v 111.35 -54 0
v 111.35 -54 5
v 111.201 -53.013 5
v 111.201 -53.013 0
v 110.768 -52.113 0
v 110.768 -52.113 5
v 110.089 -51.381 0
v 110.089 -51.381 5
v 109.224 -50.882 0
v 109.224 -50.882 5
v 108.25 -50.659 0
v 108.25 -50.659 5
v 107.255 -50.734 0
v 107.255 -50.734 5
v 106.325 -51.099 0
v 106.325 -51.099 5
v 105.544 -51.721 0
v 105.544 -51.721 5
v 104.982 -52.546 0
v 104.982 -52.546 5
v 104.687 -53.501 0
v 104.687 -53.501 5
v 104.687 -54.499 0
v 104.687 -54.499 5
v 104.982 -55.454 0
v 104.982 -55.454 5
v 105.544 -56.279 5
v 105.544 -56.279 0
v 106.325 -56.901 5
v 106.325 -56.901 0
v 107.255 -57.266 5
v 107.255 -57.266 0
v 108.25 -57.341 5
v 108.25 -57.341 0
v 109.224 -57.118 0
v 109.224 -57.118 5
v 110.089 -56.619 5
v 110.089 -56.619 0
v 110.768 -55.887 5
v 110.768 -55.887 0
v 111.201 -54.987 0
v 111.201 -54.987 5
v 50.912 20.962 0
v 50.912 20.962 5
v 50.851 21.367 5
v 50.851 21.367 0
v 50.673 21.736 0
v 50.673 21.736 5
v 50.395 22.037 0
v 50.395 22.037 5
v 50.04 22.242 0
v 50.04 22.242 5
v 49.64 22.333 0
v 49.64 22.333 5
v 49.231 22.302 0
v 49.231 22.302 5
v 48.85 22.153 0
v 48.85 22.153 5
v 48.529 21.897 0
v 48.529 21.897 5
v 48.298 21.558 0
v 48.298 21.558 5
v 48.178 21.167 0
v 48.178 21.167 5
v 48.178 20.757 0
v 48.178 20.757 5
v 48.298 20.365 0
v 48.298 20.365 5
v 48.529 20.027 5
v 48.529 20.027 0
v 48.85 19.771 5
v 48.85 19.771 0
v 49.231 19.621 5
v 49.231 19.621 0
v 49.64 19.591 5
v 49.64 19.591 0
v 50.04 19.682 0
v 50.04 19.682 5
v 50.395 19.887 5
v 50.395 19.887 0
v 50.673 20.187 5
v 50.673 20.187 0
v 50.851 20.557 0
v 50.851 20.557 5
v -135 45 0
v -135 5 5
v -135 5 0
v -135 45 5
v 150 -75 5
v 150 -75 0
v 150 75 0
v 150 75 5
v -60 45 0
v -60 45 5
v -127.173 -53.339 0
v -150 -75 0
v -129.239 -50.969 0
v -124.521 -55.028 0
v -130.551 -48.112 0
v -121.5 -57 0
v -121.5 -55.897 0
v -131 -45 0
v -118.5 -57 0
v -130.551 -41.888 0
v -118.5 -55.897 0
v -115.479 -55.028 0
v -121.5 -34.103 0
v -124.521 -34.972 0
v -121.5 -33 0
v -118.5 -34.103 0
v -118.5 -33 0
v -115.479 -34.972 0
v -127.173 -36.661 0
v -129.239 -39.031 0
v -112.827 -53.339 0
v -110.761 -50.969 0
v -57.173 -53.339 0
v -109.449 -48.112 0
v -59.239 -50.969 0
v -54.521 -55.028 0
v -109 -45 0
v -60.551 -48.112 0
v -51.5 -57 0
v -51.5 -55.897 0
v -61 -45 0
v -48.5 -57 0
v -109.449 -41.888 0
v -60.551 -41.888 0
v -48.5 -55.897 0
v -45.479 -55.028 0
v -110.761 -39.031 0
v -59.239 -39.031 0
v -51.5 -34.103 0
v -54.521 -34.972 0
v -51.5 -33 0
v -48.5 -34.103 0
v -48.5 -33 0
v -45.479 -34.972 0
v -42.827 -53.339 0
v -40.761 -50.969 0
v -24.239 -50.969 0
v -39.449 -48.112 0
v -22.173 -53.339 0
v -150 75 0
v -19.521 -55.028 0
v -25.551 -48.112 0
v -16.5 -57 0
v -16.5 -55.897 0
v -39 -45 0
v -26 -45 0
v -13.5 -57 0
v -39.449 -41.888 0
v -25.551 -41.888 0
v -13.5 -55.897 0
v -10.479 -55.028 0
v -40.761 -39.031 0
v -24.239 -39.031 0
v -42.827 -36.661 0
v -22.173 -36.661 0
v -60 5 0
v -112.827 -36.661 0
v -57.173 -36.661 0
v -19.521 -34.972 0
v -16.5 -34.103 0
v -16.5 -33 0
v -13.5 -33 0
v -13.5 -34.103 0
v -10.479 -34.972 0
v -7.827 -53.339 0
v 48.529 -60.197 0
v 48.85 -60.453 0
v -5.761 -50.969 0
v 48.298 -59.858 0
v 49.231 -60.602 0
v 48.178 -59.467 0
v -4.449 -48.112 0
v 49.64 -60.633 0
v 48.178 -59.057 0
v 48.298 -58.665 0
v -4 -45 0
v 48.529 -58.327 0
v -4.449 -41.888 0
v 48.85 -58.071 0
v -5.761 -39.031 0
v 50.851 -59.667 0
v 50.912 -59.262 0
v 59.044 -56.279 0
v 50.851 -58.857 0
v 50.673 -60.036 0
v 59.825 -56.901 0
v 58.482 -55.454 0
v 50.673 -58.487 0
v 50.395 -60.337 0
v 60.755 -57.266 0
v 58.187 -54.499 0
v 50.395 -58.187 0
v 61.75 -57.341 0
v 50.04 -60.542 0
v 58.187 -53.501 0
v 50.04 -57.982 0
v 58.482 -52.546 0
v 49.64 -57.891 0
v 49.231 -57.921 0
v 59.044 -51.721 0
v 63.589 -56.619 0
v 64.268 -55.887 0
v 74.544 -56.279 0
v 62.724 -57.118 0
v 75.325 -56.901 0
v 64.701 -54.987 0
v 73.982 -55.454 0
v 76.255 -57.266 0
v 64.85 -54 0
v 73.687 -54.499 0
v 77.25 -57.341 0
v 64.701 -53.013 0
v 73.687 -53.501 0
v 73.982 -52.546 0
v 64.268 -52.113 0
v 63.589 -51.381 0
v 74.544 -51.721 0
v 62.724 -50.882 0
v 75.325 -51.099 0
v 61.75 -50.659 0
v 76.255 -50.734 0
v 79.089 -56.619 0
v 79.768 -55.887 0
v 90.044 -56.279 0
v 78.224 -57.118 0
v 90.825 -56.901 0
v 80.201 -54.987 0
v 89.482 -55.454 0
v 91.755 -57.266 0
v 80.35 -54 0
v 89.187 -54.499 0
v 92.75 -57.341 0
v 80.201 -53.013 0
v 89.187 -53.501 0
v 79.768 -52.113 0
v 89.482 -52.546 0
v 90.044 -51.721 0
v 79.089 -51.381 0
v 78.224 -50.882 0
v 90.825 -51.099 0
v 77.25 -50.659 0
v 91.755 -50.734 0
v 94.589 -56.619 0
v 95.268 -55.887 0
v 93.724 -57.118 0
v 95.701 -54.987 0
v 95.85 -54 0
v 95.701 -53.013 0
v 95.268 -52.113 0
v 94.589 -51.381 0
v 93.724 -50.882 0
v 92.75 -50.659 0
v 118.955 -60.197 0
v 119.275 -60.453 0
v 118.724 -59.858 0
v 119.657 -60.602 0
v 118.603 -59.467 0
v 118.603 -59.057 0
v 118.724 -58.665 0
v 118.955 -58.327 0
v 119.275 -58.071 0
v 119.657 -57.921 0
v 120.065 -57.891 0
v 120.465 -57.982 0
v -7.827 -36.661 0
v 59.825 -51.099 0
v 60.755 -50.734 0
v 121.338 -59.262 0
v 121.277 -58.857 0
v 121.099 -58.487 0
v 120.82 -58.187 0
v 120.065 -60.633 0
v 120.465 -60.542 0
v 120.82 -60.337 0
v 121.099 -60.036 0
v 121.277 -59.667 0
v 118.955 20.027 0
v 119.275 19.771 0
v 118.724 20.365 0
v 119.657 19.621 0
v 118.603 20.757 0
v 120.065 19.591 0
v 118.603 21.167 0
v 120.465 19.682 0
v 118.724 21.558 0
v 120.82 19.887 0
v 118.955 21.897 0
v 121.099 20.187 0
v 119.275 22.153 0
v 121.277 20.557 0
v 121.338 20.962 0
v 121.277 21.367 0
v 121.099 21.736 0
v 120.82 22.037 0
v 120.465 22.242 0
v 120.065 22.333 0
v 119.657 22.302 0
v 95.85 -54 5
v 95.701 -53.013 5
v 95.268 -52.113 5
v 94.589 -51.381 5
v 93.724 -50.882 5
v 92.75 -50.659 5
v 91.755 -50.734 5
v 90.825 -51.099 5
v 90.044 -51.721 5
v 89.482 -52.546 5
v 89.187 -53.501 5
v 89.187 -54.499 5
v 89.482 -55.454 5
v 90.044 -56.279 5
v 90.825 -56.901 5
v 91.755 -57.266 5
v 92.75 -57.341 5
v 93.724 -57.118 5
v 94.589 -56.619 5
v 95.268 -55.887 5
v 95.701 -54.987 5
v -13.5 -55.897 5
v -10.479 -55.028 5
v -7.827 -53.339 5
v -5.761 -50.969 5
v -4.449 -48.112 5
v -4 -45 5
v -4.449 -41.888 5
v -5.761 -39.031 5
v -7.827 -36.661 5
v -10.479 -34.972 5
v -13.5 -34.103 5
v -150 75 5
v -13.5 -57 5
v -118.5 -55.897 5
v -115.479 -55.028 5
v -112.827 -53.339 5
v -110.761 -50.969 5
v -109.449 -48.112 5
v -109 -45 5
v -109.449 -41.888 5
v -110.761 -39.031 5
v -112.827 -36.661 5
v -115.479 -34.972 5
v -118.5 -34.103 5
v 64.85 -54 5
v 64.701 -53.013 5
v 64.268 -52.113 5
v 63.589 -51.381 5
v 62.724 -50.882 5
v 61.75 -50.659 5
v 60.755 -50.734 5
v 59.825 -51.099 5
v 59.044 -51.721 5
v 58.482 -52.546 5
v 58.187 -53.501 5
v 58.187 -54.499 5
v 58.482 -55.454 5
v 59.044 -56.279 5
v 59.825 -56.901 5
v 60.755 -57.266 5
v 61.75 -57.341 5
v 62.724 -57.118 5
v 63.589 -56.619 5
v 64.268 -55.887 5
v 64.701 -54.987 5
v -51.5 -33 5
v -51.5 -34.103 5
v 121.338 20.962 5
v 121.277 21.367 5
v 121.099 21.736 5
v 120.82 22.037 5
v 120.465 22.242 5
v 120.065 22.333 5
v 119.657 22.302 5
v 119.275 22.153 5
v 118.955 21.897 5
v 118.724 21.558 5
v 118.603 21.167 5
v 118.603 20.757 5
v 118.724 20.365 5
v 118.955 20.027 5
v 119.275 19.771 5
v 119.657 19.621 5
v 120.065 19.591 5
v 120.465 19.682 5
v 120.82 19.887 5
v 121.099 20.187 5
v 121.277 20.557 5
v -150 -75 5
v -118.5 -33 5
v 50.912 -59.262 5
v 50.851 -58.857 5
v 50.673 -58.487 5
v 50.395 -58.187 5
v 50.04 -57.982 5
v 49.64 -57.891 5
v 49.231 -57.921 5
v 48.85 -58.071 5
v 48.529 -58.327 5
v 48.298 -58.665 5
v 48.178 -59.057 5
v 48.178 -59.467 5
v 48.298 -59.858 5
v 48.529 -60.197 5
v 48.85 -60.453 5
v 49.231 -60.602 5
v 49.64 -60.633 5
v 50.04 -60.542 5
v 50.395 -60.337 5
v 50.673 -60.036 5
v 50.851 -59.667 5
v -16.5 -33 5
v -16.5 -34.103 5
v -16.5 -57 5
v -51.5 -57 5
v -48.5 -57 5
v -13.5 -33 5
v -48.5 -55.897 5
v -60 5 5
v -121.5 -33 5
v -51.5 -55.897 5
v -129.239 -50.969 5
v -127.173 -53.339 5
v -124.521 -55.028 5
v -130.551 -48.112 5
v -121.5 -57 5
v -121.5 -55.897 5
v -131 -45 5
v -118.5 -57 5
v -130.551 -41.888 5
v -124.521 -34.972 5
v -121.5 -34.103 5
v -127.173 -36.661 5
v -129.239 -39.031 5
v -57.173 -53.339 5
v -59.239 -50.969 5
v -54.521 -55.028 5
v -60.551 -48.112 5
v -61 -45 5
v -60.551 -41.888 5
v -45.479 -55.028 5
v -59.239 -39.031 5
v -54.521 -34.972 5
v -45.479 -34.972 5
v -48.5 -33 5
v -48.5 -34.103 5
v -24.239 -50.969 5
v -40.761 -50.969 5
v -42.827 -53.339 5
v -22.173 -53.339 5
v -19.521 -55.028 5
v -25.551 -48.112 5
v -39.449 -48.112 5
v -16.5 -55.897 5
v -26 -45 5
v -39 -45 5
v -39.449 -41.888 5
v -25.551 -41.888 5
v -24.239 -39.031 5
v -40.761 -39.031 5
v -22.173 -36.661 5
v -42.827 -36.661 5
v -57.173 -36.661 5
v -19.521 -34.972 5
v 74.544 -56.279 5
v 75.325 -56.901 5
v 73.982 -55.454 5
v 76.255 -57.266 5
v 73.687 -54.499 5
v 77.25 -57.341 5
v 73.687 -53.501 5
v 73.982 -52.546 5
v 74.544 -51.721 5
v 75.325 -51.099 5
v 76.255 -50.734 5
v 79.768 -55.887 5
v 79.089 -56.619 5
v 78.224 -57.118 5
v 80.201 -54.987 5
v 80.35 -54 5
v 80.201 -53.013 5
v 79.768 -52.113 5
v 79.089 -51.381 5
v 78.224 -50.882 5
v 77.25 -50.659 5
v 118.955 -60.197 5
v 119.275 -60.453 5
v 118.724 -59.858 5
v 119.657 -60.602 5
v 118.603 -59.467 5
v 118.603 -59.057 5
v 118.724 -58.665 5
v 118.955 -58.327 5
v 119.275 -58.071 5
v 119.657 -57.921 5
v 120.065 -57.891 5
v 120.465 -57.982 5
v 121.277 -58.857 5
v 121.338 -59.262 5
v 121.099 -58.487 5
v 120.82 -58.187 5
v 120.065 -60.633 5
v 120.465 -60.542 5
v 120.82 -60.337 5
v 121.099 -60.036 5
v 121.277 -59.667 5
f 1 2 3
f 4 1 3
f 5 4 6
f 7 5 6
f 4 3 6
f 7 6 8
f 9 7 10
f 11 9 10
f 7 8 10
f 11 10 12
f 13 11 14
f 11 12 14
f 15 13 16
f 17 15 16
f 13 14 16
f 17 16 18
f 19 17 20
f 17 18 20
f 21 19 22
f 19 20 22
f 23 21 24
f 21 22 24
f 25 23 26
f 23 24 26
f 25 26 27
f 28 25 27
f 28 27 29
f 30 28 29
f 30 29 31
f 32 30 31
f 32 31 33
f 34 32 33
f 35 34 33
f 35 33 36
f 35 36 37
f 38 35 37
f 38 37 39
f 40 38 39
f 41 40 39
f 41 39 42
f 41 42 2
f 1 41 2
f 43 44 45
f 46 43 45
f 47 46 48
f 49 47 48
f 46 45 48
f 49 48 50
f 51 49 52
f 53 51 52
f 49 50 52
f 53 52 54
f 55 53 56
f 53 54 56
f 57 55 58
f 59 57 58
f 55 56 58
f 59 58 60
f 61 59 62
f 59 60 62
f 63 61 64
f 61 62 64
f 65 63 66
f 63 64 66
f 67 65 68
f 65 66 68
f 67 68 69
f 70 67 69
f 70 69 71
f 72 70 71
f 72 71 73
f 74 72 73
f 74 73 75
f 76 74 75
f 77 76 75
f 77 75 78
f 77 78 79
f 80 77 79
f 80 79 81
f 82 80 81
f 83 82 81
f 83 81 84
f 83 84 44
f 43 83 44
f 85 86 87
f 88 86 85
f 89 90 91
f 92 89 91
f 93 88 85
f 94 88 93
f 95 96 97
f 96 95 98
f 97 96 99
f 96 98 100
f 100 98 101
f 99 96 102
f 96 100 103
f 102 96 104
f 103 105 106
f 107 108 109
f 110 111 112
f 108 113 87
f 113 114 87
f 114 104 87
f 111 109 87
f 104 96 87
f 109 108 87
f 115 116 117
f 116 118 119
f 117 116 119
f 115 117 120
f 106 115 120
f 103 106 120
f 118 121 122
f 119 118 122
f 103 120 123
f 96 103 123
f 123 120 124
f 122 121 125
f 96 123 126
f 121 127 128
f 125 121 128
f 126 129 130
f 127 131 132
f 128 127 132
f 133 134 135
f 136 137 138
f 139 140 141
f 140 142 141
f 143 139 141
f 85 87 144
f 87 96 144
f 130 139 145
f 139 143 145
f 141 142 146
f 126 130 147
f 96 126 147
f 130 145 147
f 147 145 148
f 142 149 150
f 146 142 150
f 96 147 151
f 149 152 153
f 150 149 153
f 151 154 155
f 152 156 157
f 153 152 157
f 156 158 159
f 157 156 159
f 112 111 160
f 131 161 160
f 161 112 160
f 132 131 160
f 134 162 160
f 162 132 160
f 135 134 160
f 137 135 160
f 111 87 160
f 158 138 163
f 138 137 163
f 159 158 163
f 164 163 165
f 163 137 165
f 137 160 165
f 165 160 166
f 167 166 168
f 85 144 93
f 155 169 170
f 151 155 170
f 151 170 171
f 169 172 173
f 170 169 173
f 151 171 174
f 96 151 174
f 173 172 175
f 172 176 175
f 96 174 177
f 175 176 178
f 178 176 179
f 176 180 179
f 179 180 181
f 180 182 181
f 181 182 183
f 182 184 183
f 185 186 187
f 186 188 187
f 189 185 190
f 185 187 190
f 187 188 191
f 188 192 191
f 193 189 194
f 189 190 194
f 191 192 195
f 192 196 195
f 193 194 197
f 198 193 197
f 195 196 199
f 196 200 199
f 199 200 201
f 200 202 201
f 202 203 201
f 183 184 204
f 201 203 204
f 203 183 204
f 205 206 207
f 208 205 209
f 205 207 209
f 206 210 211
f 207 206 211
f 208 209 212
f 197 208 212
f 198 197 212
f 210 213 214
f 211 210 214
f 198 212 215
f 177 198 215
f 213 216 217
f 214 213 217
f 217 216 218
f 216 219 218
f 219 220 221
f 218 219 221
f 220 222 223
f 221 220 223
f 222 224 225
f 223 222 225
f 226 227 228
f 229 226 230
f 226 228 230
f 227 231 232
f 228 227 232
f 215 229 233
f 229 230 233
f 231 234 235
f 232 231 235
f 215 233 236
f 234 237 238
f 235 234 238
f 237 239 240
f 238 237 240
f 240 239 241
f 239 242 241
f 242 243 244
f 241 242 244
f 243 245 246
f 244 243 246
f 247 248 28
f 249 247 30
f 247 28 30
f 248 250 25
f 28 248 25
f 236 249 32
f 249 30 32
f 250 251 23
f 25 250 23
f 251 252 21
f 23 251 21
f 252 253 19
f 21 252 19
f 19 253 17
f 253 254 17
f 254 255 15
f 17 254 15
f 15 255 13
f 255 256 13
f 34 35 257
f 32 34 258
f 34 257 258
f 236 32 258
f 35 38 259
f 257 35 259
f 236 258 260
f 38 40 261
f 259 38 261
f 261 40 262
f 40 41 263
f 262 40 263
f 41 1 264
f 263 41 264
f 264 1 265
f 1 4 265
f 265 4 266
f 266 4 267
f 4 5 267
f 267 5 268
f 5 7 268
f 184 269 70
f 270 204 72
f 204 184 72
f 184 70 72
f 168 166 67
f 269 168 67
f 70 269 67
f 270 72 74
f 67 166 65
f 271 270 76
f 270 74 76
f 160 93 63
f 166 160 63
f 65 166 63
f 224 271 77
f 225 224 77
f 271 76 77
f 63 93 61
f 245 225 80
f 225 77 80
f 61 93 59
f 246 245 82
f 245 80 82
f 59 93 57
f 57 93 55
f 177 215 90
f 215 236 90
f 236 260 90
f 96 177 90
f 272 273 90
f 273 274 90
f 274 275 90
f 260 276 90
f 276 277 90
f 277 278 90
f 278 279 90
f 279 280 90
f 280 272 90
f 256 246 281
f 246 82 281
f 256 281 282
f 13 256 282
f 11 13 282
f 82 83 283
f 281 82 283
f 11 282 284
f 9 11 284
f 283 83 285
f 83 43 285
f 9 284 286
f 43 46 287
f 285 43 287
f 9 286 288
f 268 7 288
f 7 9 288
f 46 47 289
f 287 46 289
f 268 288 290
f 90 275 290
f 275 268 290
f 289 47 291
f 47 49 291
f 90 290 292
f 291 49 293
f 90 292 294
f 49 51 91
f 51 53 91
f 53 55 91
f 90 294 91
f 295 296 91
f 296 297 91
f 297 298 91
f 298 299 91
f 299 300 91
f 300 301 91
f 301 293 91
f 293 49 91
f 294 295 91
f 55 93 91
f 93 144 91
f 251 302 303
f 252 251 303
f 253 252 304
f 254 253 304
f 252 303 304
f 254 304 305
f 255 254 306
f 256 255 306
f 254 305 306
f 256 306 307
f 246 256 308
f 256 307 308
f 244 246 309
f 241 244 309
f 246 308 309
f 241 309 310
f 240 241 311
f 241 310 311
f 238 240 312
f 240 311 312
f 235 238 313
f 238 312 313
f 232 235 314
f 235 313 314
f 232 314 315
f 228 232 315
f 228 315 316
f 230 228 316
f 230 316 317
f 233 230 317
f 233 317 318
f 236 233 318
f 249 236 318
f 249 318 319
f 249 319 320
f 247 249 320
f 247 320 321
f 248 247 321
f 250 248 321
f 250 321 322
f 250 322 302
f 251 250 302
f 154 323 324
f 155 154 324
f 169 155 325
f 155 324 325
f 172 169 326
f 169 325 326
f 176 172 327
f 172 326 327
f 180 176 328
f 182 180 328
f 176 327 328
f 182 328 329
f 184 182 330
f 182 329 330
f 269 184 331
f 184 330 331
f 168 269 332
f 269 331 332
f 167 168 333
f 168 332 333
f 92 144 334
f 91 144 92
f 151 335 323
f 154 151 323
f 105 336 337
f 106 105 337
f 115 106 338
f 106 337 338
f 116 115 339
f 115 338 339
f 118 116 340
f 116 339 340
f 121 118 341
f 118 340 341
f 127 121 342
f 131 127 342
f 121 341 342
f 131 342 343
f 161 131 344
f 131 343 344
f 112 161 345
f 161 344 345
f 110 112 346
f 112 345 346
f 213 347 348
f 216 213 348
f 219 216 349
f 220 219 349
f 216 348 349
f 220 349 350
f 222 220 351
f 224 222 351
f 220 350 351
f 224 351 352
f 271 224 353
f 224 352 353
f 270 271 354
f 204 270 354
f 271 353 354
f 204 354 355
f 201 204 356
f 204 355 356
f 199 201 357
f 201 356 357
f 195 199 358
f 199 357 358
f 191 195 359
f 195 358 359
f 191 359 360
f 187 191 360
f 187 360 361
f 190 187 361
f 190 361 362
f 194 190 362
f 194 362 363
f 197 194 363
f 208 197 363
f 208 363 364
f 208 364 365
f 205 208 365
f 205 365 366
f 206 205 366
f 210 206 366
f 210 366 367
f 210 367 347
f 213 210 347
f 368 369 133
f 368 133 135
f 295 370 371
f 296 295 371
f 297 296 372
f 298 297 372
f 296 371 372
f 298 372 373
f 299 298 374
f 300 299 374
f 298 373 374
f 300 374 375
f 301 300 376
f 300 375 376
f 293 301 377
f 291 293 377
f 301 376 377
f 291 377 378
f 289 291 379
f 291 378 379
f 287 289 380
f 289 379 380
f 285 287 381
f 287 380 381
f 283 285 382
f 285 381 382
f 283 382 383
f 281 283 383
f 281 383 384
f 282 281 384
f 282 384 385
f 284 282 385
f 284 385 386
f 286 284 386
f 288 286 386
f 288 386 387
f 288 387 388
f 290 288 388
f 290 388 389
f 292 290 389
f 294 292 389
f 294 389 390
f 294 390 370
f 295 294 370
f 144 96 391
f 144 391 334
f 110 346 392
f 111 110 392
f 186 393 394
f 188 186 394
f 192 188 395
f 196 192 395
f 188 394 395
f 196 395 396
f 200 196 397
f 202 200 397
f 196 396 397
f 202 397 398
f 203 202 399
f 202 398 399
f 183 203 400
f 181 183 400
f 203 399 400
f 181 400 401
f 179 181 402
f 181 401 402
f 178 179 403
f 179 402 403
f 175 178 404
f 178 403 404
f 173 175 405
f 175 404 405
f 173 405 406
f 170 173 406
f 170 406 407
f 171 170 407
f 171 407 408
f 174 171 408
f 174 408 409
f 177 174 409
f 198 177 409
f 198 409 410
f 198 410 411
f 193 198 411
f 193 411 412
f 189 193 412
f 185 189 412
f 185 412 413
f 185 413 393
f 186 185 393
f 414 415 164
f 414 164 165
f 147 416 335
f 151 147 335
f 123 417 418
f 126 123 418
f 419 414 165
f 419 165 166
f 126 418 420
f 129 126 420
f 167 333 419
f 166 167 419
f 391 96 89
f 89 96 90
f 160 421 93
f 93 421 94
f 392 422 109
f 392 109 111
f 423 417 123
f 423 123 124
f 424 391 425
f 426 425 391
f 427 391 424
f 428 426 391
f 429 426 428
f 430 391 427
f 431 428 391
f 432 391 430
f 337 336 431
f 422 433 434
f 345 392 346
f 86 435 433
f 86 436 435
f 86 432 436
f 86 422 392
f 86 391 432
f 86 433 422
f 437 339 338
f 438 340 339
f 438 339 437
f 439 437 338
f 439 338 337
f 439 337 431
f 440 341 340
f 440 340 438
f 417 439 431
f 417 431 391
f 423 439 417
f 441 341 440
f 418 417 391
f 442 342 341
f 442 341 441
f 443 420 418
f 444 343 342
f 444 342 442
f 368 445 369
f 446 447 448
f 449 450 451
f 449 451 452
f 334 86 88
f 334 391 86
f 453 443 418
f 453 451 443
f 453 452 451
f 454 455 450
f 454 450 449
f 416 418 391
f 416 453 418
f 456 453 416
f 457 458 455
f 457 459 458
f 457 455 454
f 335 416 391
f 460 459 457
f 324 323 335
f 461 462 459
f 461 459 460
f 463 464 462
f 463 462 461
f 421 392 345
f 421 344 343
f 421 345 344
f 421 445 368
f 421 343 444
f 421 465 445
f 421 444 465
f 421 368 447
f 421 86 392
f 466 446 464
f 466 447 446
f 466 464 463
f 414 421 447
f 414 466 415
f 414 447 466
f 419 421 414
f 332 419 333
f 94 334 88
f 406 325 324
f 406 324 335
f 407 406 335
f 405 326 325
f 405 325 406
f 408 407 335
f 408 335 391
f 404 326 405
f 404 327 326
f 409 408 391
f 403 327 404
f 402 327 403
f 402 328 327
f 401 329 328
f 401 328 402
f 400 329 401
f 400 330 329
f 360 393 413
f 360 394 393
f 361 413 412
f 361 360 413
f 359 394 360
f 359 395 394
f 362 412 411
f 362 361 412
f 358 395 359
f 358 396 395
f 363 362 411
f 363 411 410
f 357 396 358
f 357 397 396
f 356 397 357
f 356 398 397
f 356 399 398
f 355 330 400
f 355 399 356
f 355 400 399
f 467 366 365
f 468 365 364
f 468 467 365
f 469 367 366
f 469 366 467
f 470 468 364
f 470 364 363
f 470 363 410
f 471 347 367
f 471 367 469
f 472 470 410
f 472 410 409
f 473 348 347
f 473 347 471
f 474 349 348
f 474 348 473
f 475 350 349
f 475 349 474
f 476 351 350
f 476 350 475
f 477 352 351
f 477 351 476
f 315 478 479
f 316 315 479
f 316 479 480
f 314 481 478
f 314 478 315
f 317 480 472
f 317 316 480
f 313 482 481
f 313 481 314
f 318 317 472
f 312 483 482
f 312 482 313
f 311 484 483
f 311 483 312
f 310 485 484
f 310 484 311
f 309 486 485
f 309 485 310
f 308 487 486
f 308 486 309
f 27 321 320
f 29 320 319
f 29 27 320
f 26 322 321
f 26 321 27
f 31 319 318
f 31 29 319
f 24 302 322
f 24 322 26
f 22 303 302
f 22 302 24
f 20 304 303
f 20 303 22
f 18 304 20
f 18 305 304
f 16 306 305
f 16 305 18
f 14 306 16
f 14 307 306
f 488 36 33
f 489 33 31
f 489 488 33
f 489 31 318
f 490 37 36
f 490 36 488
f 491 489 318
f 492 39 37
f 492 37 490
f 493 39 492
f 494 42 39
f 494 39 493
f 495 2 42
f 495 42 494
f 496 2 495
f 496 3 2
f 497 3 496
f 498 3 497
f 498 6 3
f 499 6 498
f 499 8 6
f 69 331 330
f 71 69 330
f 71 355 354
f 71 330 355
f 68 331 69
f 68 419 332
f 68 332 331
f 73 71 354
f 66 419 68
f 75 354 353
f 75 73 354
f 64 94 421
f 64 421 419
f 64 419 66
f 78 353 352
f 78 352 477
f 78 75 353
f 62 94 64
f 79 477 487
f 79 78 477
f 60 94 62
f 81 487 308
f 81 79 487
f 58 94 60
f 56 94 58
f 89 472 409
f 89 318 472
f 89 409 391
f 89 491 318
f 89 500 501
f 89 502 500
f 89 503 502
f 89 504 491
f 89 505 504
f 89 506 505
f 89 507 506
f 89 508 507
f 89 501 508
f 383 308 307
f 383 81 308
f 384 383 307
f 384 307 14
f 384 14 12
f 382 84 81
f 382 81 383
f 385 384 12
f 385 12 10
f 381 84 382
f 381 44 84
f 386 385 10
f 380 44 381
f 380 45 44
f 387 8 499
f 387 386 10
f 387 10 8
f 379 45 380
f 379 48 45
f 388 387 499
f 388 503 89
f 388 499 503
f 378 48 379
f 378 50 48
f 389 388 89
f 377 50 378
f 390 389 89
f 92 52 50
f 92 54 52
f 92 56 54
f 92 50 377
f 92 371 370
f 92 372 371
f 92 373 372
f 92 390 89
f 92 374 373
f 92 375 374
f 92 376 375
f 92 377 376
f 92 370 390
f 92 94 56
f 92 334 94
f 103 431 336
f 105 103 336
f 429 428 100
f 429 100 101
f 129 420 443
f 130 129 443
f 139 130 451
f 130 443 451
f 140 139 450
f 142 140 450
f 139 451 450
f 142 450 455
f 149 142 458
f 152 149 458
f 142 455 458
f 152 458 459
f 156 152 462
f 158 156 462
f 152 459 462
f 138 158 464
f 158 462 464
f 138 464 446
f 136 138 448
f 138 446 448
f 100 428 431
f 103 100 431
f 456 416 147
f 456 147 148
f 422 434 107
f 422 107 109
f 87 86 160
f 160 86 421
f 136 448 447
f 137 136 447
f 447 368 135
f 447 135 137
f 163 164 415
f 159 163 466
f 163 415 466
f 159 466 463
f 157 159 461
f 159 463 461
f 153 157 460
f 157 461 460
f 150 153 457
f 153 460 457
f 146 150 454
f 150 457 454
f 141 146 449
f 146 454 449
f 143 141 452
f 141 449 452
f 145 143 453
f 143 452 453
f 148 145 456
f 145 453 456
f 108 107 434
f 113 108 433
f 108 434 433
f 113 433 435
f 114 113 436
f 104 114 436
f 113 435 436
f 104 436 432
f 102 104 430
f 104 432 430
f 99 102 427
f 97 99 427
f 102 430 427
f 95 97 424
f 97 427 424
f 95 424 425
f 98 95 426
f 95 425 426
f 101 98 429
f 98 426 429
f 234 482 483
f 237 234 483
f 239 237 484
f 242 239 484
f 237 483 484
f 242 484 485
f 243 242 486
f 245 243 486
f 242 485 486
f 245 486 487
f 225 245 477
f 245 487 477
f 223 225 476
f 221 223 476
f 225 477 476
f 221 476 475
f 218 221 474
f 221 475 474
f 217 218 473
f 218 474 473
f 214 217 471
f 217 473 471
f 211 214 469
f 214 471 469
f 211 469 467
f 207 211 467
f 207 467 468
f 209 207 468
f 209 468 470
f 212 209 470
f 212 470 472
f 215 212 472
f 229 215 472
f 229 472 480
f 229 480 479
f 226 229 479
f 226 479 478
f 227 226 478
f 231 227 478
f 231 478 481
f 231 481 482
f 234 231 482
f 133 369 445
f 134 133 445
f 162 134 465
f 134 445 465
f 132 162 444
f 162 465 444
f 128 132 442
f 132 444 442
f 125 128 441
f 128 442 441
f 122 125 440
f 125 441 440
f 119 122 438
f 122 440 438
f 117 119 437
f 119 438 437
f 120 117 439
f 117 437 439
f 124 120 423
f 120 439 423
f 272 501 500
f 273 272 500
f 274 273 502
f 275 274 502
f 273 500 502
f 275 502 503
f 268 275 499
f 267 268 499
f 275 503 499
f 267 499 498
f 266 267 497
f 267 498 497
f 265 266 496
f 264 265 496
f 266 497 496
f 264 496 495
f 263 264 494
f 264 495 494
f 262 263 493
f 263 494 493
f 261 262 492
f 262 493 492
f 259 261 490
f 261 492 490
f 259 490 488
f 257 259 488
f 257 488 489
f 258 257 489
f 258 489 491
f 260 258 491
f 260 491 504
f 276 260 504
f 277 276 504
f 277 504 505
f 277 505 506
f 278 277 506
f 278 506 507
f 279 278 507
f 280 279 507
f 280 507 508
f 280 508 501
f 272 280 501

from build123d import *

# Parameters (mm, degrees)
SKIZZE1_W                       = 300
SKIZZE1_H                       = 150
AUFSATZ_LINEAR_AUSTRAGEN1_DEPTH = 5
SKIZZE3_W                       = 75
SKIZZE3_H                       = 40
SCHNITT_LINEAR_AUSTRAGEN2_DEPTH = 168.779617356
SKIZZE5_R                       = 11
SKIZZE5_W                       = 3
SKIZZE5_H                       = 24
SCHNITT_LINEAR_AUSTRAGEN4_DEPTH = 168.779617356
SKIZZE2_R                       = 1.375
SKIZZE2_R_2                     = 3.35
SCHNITT_LINEAR_AUSTRAGEN5_DEPTH = 168.779617356


with BuildPart() as part:
    # Skizze1 → Aufsatz-Linear austragen1 (new body)
    with BuildSketch(Plane.XY):
        Rectangle(SKIZZE1_W, SKIZZE1_H)
    extrude(amount=AUFSATZ_LINEAR_AUSTRAGEN1_DEPTH)

    # Skizze3 → Schnitt-Linear austragen2 (cut, through all)
    with BuildSketch(Plane.XY.offset(5)):
        with Locations((-97.5, 25)):
            Rectangle(SKIZZE3_W, SKIZZE3_H)
    extrude(amount=-SCHNITT_LINEAR_AUSTRAGEN2_DEPTH, mode=Mode.SUBTRACT)

    # Skizze5 → Schnitt-Linear austragen4 (cut, through all)
    with BuildSketch(Plane.XY.offset(5)):
        with Locations((-15, -45)):
            Circle(SKIZZE5_R)
        with Locations((-50, -45)):
            Circle(SKIZZE5_R)
        with Locations((-120, -45)):
            Circle(SKIZZE5_R)
        with Locations((-15, -45)):
            Rectangle(SKIZZE5_W, SKIZZE5_H)
        with Locations((-50, -45)):
            Rectangle(SKIZZE5_W, SKIZZE5_H)
        with Locations((-120, -45)):
            Rectangle(SKIZZE5_W, SKIZZE5_H)
    extrude(amount=-SCHNITT_LINEAR_AUSTRAGEN4_DEPTH, mode=Mode.SUBTRACT)

    # Skizze2 → Schnitt-Linear austragen5 (cut, through all)
    with BuildSketch(Plane.XY.offset(5)):
        with Locations((49.537329599, 20.961824544)):
            Circle(SKIZZE2_R)
        with Locations((119.962670401, 20.961824544)):
            Circle(SKIZZE2_R)
        with Locations((119.962670401, -59.261824544)):
            Circle(SKIZZE2_R)
        with Locations((49.537329599, -59.261824544)):
            Circle(SKIZZE2_R)
        with Locations((61.5, -54)):
            Circle(SKIZZE2_R_2)
        with Locations((77, -54)):
            Circle(SKIZZE2_R_2)
        with Locations((92.5, -54)):
            Circle(SKIZZE2_R_2)
        with Locations((108, -54)):
            Circle(SKIZZE2_R_2)
    extrude(amount=-SCHNITT_LINEAR_AUSTRAGEN5_DEPTH, mode=Mode.SUBTRACT)


solid = part.part
